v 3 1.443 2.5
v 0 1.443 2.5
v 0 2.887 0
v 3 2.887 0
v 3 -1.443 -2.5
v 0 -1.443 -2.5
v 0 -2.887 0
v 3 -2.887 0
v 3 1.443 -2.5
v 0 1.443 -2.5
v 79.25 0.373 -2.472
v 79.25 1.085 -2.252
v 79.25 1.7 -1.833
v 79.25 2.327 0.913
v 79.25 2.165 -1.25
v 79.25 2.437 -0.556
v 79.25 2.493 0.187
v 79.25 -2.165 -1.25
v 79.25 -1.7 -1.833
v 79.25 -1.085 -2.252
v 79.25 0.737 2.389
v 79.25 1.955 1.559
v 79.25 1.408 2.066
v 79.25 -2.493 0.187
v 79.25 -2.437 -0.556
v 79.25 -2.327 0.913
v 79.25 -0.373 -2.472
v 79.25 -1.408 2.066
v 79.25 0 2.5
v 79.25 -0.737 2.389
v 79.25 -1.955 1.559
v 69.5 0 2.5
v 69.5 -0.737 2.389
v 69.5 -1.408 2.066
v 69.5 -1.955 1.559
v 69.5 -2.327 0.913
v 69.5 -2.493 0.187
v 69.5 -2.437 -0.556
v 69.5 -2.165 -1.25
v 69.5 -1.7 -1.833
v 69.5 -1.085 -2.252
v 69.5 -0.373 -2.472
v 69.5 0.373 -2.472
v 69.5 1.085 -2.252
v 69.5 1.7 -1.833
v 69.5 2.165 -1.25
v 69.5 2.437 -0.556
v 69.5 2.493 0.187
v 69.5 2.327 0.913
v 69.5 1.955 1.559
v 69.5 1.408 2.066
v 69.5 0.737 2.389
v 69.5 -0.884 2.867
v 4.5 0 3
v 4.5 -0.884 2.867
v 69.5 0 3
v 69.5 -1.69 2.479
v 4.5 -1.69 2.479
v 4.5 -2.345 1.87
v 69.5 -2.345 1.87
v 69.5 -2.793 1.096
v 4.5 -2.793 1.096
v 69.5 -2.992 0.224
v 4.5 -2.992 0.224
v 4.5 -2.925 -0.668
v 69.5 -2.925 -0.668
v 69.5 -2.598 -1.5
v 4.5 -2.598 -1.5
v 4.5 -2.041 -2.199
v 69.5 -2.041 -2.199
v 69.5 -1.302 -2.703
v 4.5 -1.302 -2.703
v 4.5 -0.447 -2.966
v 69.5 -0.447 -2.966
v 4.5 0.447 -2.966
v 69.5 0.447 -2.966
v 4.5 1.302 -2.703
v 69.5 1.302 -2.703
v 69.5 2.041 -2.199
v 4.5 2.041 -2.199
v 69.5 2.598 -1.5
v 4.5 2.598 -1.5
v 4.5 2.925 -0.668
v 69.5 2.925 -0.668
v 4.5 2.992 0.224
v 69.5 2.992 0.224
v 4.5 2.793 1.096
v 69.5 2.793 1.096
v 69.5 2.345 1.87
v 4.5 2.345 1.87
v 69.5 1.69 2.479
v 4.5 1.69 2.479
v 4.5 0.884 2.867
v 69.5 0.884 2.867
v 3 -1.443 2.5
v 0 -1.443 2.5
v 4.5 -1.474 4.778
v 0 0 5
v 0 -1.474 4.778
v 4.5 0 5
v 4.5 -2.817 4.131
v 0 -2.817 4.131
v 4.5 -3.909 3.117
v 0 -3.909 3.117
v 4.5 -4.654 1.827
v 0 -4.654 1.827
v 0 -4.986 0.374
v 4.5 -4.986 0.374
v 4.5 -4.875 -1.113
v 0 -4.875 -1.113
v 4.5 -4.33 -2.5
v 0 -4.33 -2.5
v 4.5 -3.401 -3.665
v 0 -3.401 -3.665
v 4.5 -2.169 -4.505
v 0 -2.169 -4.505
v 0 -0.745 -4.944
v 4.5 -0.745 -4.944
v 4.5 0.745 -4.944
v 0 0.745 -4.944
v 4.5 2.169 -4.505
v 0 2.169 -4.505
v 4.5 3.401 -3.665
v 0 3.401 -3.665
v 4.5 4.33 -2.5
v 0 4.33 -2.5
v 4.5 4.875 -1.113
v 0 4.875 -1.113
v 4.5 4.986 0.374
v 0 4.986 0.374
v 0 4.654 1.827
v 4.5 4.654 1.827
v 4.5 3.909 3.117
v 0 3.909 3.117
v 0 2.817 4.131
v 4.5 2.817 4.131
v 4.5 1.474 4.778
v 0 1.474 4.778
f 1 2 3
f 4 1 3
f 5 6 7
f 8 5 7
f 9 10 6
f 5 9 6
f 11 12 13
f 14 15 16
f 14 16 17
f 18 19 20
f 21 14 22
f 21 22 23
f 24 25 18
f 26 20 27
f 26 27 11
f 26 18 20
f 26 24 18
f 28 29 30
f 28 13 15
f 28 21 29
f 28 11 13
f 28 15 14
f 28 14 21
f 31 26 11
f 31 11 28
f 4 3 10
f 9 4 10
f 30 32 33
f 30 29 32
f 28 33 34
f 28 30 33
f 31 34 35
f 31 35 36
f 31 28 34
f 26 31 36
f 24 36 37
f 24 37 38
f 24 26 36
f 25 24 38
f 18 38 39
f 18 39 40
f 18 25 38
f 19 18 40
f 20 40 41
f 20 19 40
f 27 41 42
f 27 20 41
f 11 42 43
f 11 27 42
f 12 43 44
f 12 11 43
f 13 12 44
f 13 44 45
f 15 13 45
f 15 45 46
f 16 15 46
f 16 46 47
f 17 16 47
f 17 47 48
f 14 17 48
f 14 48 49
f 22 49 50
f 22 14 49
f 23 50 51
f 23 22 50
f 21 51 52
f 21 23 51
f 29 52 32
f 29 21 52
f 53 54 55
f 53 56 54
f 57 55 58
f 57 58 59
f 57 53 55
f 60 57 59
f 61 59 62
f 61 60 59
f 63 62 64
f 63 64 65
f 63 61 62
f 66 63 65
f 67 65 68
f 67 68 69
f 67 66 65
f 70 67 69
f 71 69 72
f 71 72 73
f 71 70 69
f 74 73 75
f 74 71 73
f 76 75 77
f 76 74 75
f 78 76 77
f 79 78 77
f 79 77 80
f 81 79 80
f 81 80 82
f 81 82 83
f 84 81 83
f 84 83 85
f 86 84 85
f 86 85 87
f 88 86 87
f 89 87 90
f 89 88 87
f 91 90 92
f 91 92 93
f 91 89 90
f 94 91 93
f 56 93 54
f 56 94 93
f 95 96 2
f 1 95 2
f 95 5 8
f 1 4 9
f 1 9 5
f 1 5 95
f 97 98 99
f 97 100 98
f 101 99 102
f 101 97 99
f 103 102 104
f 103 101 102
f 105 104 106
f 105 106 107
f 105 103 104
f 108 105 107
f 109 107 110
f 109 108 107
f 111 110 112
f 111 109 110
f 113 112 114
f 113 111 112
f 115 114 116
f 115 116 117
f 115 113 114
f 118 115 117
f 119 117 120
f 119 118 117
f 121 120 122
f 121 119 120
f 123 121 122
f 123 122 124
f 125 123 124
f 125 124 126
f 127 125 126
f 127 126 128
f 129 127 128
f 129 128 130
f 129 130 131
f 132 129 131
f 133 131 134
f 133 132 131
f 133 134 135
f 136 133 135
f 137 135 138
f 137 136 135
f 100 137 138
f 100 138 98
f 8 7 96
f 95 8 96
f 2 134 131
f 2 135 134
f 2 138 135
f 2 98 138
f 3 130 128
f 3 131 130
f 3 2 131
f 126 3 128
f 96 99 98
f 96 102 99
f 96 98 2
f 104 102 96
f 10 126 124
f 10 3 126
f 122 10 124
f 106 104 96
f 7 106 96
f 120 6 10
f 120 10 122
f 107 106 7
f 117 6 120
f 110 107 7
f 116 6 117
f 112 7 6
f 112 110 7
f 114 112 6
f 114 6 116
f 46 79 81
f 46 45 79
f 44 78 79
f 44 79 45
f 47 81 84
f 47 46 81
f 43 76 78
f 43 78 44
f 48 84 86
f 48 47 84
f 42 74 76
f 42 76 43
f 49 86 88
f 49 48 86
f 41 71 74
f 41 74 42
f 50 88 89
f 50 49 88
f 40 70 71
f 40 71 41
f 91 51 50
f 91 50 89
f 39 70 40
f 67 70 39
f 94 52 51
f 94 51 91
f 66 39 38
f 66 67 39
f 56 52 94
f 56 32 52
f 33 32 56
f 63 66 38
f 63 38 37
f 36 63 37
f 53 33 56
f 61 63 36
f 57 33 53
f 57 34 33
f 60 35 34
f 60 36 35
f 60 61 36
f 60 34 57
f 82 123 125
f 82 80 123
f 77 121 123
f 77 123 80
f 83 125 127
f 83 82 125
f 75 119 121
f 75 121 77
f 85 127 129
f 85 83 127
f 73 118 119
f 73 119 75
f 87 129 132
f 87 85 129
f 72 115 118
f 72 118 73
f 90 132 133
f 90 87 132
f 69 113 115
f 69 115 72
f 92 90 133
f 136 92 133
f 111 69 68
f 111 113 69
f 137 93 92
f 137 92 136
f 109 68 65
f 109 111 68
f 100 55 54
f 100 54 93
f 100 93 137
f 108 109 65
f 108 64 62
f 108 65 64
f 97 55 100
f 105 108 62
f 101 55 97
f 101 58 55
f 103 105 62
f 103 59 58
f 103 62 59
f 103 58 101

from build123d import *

# Parameters (mm, degrees)
CUT_EXTRUDE_1_DEPTH = 3


with BuildPart() as part:
    # 草图1 → 旋转1 (revolve)
    with BuildSketch(Plane.XY, mode=Mode.PRIVATE) as revolve_1_sk:
        Polygon((0, 0), (0, 5), (4.5, 5), (4.5, 3), (69.5, 3), (69.5, 2.5), (79.25, 2.5), (79.25, 0), align=None)
    revolve(revolve_1_sk.sketch.rotate(Axis((0, 0, 0), (1, 0, 0)), 90), axis=Axis((0, 0, 0), (1, 0, 0)))

    # 草图2 → 切除-拉伸1 (cut)
    with BuildSketch(Plane.ZY):
        Polygon((0, 2.886751346), (-2.5, 1.443375673), (-2.5, -1.443375673), (0, -2.886751346), (2.5, -1.443375673), (2.5, 1.443375673), align=None)
    extrude(amount=-CUT_EXTRUDE_1_DEPTH, mode=Mode.SUBTRACT)


solid = part.part
